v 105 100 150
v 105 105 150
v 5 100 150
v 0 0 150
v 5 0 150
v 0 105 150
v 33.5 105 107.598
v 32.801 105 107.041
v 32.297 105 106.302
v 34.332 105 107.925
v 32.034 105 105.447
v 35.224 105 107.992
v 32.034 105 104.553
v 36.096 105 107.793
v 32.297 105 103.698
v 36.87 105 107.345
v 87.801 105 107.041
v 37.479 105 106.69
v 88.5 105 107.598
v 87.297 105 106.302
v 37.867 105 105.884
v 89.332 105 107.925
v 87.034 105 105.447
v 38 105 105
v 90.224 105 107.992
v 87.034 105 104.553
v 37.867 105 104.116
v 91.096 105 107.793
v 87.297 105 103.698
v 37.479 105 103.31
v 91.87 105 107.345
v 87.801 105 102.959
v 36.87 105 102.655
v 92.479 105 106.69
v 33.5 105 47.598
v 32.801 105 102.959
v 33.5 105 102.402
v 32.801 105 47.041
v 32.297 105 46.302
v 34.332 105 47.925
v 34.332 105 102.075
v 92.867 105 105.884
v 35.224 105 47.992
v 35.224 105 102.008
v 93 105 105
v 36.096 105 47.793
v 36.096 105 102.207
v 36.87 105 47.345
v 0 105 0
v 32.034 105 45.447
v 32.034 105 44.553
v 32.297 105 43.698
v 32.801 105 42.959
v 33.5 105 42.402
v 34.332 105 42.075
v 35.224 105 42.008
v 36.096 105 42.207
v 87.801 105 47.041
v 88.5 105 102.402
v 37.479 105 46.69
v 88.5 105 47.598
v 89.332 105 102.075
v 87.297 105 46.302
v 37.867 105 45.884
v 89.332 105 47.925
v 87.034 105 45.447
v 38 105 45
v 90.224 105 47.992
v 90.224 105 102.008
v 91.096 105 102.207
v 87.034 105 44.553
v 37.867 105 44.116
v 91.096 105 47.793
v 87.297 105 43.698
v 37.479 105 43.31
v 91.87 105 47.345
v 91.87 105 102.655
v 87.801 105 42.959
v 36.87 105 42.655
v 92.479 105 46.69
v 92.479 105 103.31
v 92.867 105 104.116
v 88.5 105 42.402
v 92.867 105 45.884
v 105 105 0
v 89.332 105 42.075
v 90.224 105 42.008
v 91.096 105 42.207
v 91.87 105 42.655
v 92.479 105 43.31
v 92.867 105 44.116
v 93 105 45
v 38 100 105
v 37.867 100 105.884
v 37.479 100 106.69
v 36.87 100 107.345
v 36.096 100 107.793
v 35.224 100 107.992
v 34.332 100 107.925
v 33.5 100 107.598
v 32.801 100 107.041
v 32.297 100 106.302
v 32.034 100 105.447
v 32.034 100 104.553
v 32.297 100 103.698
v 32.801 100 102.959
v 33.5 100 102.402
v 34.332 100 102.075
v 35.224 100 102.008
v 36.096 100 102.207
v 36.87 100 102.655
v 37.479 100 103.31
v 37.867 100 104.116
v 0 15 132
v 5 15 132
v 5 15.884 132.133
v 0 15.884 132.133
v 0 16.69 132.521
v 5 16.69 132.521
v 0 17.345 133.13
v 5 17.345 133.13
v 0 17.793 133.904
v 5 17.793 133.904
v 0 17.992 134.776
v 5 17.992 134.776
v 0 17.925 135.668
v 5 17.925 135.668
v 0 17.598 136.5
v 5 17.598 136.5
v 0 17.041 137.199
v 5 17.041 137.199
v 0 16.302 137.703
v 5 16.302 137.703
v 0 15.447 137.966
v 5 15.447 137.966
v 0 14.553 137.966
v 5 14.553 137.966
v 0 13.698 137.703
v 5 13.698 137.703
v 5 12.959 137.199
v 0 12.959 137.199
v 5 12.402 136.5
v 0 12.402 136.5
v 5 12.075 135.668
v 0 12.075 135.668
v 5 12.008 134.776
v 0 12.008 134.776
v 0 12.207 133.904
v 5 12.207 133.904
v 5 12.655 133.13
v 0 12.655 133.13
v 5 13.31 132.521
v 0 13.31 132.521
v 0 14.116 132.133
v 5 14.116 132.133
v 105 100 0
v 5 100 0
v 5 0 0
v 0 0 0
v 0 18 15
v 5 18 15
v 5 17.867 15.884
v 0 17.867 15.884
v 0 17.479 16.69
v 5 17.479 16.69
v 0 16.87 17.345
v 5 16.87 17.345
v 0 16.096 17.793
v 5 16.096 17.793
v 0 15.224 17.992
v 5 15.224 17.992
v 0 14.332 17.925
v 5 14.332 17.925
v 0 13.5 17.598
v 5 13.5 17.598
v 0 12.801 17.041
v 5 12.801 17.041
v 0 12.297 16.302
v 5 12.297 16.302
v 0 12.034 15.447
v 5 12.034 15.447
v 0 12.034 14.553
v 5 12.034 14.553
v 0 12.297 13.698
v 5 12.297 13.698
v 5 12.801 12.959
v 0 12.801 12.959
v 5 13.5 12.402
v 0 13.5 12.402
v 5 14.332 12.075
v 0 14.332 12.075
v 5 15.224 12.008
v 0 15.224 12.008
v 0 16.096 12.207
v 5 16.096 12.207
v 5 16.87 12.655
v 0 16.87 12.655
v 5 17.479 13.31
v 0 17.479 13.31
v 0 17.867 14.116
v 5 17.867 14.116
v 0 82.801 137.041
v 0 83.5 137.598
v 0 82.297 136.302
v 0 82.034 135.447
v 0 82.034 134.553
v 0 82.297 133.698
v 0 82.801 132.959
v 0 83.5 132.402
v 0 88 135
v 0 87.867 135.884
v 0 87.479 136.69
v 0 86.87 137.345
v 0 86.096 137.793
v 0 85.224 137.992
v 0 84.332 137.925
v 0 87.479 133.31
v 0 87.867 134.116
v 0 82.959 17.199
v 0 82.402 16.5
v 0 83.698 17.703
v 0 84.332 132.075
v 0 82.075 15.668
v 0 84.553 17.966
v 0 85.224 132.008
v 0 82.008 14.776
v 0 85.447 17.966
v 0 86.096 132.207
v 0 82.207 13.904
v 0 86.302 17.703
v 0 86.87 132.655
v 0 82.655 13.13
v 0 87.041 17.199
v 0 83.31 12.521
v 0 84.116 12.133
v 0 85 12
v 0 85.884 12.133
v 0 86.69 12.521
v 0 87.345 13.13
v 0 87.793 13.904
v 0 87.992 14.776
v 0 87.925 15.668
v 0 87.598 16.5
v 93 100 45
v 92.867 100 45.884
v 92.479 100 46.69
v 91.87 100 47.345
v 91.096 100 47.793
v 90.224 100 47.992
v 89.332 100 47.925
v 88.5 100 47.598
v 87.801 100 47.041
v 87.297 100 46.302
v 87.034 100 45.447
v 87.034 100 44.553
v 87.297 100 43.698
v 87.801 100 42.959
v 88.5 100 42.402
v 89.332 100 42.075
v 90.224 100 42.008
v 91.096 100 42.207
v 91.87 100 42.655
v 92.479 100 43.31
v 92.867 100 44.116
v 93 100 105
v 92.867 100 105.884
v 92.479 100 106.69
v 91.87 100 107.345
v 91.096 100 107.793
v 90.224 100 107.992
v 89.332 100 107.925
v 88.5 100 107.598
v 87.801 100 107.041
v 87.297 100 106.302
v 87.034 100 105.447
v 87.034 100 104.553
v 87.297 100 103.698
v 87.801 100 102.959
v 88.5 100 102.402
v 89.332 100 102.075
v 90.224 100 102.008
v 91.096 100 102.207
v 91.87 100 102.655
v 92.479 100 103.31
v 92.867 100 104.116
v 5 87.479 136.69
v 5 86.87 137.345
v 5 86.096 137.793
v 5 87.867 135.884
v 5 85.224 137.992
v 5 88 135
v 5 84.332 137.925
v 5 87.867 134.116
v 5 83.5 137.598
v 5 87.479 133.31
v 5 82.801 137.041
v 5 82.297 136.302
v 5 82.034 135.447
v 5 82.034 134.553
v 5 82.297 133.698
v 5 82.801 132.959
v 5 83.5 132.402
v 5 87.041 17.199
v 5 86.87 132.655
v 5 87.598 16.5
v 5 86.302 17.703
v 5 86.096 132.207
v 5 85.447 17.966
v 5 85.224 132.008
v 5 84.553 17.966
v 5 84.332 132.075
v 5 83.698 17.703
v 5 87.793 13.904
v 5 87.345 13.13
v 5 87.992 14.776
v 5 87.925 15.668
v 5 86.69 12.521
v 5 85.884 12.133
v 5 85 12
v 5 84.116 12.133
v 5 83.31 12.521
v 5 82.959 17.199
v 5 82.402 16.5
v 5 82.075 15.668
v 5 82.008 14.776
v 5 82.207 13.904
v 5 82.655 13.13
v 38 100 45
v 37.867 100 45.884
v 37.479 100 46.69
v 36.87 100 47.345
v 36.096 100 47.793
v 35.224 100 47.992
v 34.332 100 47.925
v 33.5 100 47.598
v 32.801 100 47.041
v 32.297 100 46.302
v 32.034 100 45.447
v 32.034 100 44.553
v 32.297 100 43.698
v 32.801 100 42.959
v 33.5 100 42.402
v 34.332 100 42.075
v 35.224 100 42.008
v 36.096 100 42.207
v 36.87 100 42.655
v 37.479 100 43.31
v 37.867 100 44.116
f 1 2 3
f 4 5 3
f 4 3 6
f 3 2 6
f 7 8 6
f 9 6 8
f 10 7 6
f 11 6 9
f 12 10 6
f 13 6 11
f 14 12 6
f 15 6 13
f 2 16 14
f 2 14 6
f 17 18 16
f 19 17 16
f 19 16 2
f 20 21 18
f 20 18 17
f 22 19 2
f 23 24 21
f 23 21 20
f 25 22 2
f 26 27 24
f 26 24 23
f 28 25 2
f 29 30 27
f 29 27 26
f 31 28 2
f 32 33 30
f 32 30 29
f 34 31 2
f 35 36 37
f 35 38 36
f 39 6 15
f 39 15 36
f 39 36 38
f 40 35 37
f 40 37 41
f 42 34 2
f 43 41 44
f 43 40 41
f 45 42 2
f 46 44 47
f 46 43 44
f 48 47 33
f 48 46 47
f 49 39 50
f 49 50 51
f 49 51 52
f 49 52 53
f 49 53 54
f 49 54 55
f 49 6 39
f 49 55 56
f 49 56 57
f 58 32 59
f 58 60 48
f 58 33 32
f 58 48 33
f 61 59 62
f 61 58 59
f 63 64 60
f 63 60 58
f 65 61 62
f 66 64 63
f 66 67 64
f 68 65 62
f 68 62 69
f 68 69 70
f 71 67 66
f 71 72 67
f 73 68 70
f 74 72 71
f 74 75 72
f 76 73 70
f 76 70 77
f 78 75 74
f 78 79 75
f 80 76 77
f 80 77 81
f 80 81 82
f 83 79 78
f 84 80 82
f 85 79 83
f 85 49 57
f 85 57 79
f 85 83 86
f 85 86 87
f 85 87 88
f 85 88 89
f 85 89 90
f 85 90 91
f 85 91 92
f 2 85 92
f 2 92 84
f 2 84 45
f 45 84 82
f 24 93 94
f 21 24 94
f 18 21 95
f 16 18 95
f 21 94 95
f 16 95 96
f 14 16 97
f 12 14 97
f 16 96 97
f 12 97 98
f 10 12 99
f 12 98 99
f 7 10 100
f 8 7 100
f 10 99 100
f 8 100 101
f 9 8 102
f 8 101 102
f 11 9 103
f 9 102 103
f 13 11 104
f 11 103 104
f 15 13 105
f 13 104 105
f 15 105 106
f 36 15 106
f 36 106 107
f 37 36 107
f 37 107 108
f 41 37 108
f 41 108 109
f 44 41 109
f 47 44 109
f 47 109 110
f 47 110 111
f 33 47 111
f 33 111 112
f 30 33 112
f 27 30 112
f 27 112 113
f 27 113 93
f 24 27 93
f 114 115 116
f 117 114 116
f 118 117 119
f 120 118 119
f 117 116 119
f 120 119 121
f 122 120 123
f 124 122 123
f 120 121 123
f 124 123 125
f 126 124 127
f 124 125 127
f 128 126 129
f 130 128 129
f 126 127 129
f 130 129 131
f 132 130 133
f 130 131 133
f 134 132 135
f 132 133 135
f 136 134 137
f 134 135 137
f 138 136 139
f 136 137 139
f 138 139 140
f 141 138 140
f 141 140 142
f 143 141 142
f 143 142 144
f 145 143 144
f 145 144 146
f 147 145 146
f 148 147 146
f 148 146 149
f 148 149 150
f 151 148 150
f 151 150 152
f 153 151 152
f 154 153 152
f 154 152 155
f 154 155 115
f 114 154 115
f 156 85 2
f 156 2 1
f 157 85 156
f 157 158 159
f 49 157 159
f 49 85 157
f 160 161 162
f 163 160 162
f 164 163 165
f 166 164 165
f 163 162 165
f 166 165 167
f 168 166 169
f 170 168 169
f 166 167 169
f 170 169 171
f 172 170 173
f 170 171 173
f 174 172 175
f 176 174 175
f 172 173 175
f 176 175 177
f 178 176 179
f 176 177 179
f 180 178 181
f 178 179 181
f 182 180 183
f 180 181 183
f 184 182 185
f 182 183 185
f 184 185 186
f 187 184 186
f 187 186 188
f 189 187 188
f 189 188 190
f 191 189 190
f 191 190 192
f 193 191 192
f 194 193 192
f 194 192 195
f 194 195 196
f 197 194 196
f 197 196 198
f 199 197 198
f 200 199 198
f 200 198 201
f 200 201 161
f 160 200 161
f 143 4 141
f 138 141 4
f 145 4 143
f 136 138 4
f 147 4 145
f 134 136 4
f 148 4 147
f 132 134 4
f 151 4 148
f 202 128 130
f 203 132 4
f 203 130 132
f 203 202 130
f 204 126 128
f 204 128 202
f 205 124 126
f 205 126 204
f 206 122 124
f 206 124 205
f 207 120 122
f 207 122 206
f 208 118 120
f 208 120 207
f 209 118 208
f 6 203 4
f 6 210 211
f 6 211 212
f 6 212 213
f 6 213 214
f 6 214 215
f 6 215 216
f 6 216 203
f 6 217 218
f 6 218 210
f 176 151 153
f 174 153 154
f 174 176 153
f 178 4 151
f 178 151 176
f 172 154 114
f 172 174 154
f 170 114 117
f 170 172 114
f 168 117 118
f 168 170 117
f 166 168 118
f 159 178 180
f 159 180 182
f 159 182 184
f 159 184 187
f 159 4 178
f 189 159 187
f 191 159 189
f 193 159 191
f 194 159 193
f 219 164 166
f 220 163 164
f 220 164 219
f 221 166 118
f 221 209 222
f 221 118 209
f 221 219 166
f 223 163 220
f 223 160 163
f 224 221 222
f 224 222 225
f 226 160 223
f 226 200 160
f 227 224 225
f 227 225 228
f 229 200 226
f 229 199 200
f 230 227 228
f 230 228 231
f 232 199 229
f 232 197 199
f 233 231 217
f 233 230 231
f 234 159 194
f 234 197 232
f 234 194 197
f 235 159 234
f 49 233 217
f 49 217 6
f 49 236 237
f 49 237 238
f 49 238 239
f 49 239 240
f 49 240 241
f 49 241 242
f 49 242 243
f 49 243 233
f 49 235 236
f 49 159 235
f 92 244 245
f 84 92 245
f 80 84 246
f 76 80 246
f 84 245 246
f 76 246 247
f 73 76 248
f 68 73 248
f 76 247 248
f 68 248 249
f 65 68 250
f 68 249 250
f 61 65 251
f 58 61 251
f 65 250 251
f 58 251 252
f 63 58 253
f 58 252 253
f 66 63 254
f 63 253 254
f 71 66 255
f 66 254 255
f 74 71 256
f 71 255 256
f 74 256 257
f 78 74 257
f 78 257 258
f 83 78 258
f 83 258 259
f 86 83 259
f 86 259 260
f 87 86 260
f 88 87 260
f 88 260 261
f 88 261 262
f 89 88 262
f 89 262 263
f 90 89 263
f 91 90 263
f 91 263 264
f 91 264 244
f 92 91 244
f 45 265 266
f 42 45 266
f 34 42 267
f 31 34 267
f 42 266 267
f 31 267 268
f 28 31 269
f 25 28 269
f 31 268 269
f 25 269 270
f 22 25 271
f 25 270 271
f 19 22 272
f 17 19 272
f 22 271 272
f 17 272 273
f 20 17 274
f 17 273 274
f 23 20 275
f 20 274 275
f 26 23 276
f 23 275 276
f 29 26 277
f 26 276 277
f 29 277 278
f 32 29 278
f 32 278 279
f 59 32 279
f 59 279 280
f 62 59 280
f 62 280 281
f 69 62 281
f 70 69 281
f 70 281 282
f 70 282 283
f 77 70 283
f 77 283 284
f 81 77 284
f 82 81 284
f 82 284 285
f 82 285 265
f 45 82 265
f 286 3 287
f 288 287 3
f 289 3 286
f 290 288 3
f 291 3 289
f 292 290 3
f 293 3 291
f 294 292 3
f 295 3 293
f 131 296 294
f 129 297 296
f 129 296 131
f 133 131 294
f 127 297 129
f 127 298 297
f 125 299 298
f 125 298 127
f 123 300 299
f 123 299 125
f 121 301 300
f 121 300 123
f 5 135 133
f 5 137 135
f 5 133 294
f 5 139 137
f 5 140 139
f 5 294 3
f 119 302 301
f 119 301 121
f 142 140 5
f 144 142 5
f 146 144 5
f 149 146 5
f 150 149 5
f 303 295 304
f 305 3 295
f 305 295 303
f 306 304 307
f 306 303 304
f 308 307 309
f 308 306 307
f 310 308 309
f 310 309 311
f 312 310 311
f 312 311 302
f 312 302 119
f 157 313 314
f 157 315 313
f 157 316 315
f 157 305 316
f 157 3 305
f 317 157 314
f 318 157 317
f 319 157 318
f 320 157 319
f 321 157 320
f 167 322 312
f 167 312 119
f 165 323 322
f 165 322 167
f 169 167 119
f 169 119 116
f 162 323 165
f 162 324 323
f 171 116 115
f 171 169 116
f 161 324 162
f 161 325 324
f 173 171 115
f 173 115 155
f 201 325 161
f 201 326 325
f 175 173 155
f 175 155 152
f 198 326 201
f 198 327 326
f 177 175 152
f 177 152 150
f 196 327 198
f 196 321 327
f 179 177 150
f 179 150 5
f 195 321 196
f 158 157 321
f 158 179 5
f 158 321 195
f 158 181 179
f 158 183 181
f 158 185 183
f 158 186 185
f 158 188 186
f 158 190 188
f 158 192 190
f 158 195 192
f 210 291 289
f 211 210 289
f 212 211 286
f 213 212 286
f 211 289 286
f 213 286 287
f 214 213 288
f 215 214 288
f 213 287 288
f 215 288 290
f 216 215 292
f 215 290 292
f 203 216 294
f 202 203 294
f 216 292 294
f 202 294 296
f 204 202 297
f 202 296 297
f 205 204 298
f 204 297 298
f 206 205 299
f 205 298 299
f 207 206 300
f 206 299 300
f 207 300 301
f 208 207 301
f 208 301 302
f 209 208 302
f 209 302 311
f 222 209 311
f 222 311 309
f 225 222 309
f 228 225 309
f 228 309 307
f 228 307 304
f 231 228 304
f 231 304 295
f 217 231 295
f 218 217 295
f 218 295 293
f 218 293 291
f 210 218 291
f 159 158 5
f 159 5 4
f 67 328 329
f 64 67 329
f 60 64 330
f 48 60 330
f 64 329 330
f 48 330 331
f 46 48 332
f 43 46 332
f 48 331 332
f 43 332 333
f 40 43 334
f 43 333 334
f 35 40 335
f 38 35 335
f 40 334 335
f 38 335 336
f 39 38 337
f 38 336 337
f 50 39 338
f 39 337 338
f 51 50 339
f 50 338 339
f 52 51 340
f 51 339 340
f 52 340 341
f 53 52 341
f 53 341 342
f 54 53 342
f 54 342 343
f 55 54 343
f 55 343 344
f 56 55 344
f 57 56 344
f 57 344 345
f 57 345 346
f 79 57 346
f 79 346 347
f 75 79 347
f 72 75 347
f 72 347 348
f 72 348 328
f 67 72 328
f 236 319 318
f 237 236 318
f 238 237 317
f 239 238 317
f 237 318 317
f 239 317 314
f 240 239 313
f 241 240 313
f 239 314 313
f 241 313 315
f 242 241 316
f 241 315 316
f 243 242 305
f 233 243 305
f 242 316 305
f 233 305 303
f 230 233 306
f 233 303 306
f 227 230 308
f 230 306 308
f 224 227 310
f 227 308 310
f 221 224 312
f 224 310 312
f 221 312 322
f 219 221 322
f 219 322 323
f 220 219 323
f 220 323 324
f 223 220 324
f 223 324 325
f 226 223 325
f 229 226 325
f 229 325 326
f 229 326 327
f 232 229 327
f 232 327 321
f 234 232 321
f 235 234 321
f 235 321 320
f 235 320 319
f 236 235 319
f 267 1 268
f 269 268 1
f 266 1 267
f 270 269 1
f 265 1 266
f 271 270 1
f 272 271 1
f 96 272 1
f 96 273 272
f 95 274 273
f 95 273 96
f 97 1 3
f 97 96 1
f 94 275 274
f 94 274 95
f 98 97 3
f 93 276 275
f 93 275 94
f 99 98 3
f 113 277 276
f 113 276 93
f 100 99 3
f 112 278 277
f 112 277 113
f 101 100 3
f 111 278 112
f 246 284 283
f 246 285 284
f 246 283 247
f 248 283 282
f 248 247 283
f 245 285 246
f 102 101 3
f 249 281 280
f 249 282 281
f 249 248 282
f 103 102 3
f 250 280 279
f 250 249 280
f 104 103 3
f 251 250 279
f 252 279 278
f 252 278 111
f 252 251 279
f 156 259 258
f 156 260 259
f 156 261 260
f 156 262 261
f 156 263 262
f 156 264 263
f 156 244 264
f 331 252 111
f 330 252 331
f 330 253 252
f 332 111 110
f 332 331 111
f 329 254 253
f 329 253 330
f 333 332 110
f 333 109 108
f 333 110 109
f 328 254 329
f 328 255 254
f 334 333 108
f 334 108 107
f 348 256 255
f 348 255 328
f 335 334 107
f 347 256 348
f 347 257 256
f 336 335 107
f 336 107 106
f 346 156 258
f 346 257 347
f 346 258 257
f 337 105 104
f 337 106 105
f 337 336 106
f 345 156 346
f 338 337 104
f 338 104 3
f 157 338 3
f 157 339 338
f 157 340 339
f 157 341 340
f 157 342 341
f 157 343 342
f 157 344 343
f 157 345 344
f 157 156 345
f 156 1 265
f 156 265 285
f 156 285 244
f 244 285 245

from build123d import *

# Parameters (mm, degrees)
BOSS_EXTRUDE1_DEPTH = 150
CUT_EXTRUDE1_REACH  = 210.626
SKETCH2_R           = 3
CUT_EXTRUDE2_REACH  = 210.626
SKETCH3_R           = 3


with BuildPart() as part:
    # Sketch1 → Boss-Extrude1 (new body)
    with BuildSketch(Plane.XY):
        Polygon((0, 0), (0, 105), (105, 105), (105, 100), (5, 100), (5, 0), align=None)
    extrude(amount=BOSS_EXTRUDE1_DEPTH)

    # Sketch2 → Cut-Extrude1 (cut, up to next)
    with BuildSketch(Plane(origin=(5, 0, 0), x_dir=(0, 0, -1), z_dir=(1, 0, 0)), mode=Mode.PRIVATE) as cut_extrude1_sk1:
        with Locations(Location((-135, 85, 0), (0, 0, 90))):
            Circle(SKETCH2_R)
    cut_extrude1_tool1 = extrude(cut_extrude1_sk1.sketch, amount=-CUT_EXTRUDE1_REACH, mode=Mode.PRIVATE) & part.part
    # Sketch2 → Cut-Extrude1 (cut, up to next)
    with BuildSketch(Plane(origin=(5, 0, 0), x_dir=(0, 0, -1), z_dir=(1, 0, 0)), mode=Mode.PRIVATE) as cut_extrude1_sk2:
        with Locations((-15, 85)):
            Circle(SKETCH2_R)
    cut_extrude1_tool2 = extrude(cut_extrude1_sk2.sketch, amount=-CUT_EXTRUDE1_REACH, mode=Mode.PRIVATE) & part.part
    # Sketch2 → Cut-Extrude1 (cut, up to next)
    with BuildSketch(Plane(origin=(5, 0, 0), x_dir=(0, 0, -1), z_dir=(1, 0, 0)), mode=Mode.PRIVATE) as cut_extrude1_sk3:
        with Locations(Location((-15, 15, 0), (0, 0, 90))):
            Circle(SKETCH2_R)
    cut_extrude1_tool3 = extrude(cut_extrude1_sk3.sketch, amount=-CUT_EXTRUDE1_REACH, mode=Mode.PRIVATE) & part.part
    # Sketch2 → Cut-Extrude1 (cut, up to next)
    with BuildSketch(Plane(origin=(5, 0, 0), x_dir=(0, 0, -1), z_dir=(1, 0, 0)), mode=Mode.PRIVATE) as cut_extrude1_sk4:
        with Locations((-135, 15)):
            Circle(SKETCH2_R)
    cut_extrude1_tool4 = extrude(cut_extrude1_sk4.sketch, amount=-CUT_EXTRUDE1_REACH, mode=Mode.PRIVATE) & part.part
    add(cut_extrude1_tool1.solids().sort_by_distance((5, 85, 135))[0], mode=Mode.SUBTRACT)
    add(cut_extrude1_tool2.solids().sort_by_distance((5, 85, 15))[0], mode=Mode.SUBTRACT)
    add(cut_extrude1_tool3.solids().sort_by_distance((5, 15, 15))[0], mode=Mode.SUBTRACT)
    add(cut_extrude1_tool4.solids().sort_by_distance((5, 15, 135))[0], mode=Mode.SUBTRACT)

    # Sketch3 → Cut-Extrude2 (cut, up to next)
    with BuildSketch(Plane.XZ.offset(-100), mode=Mode.PRIVATE) as cut_extrude2_sk1:
        with Locations((35, 105)):
            Circle(SKETCH3_R)
    cut_extrude2_tool1 = extrude(cut_extrude2_sk1.sketch, amount=-CUT_EXTRUDE2_REACH, mode=Mode.PRIVATE) & part.part
    # Sketch3 → Cut-Extrude2 (cut, up to next)
    with BuildSketch(Plane.XZ.offset(-100), mode=Mode.PRIVATE) as cut_extrude2_sk2:
        with Locations((90, 105)):
            Circle(SKETCH3_R)
    cut_extrude2_tool2 = extrude(cut_extrude2_sk2.sketch, amount=-CUT_EXTRUDE2_REACH, mode=Mode.PRIVATE) & part.part
    # Sketch3 → Cut-Extrude2 (cut, up to next)
    with BuildSketch(Plane.XZ.offset(-100), mode=Mode.PRIVATE) as cut_extrude2_sk3:
        with Locations((90, 45)):
            Circle(SKETCH3_R)
    cut_extrude2_tool3 = extrude(cut_extrude2_sk3.sketch, amount=-CUT_EXTRUDE2_REACH, mode=Mode.PRIVATE) & part.part
    # Sketch3 → Cut-Extrude2 (cut, up to next)
    with BuildSketch(Plane.XZ.offset(-100), mode=Mode.PRIVATE) as cut_extrude2_sk4:
        with Locations((35, 45)):
            Circle(SKETCH3_R)
    cut_extrude2_tool4 = extrude(cut_extrude2_sk4.sketch, amount=-CUT_EXTRUDE2_REACH, mode=Mode.PRIVATE) & part.part
    add(cut_extrude2_tool1.solids().sort_by_distance((35, 100, 105))[0], mode=Mode.SUBTRACT)
    add(cut_extrude2_tool2.solids().sort_by_distance((90, 100, 105))[0], mode=Mode.SUBTRACT)
    add(cut_extrude2_tool3.solids().sort_by_distance((90, 100, 45))[0], mode=Mode.SUBTRACT)
    add(cut_extrude2_tool4.solids().sort_by_distance((35, 100, 45))[0], mode=Mode.SUBTRACT)


solid = part.part
